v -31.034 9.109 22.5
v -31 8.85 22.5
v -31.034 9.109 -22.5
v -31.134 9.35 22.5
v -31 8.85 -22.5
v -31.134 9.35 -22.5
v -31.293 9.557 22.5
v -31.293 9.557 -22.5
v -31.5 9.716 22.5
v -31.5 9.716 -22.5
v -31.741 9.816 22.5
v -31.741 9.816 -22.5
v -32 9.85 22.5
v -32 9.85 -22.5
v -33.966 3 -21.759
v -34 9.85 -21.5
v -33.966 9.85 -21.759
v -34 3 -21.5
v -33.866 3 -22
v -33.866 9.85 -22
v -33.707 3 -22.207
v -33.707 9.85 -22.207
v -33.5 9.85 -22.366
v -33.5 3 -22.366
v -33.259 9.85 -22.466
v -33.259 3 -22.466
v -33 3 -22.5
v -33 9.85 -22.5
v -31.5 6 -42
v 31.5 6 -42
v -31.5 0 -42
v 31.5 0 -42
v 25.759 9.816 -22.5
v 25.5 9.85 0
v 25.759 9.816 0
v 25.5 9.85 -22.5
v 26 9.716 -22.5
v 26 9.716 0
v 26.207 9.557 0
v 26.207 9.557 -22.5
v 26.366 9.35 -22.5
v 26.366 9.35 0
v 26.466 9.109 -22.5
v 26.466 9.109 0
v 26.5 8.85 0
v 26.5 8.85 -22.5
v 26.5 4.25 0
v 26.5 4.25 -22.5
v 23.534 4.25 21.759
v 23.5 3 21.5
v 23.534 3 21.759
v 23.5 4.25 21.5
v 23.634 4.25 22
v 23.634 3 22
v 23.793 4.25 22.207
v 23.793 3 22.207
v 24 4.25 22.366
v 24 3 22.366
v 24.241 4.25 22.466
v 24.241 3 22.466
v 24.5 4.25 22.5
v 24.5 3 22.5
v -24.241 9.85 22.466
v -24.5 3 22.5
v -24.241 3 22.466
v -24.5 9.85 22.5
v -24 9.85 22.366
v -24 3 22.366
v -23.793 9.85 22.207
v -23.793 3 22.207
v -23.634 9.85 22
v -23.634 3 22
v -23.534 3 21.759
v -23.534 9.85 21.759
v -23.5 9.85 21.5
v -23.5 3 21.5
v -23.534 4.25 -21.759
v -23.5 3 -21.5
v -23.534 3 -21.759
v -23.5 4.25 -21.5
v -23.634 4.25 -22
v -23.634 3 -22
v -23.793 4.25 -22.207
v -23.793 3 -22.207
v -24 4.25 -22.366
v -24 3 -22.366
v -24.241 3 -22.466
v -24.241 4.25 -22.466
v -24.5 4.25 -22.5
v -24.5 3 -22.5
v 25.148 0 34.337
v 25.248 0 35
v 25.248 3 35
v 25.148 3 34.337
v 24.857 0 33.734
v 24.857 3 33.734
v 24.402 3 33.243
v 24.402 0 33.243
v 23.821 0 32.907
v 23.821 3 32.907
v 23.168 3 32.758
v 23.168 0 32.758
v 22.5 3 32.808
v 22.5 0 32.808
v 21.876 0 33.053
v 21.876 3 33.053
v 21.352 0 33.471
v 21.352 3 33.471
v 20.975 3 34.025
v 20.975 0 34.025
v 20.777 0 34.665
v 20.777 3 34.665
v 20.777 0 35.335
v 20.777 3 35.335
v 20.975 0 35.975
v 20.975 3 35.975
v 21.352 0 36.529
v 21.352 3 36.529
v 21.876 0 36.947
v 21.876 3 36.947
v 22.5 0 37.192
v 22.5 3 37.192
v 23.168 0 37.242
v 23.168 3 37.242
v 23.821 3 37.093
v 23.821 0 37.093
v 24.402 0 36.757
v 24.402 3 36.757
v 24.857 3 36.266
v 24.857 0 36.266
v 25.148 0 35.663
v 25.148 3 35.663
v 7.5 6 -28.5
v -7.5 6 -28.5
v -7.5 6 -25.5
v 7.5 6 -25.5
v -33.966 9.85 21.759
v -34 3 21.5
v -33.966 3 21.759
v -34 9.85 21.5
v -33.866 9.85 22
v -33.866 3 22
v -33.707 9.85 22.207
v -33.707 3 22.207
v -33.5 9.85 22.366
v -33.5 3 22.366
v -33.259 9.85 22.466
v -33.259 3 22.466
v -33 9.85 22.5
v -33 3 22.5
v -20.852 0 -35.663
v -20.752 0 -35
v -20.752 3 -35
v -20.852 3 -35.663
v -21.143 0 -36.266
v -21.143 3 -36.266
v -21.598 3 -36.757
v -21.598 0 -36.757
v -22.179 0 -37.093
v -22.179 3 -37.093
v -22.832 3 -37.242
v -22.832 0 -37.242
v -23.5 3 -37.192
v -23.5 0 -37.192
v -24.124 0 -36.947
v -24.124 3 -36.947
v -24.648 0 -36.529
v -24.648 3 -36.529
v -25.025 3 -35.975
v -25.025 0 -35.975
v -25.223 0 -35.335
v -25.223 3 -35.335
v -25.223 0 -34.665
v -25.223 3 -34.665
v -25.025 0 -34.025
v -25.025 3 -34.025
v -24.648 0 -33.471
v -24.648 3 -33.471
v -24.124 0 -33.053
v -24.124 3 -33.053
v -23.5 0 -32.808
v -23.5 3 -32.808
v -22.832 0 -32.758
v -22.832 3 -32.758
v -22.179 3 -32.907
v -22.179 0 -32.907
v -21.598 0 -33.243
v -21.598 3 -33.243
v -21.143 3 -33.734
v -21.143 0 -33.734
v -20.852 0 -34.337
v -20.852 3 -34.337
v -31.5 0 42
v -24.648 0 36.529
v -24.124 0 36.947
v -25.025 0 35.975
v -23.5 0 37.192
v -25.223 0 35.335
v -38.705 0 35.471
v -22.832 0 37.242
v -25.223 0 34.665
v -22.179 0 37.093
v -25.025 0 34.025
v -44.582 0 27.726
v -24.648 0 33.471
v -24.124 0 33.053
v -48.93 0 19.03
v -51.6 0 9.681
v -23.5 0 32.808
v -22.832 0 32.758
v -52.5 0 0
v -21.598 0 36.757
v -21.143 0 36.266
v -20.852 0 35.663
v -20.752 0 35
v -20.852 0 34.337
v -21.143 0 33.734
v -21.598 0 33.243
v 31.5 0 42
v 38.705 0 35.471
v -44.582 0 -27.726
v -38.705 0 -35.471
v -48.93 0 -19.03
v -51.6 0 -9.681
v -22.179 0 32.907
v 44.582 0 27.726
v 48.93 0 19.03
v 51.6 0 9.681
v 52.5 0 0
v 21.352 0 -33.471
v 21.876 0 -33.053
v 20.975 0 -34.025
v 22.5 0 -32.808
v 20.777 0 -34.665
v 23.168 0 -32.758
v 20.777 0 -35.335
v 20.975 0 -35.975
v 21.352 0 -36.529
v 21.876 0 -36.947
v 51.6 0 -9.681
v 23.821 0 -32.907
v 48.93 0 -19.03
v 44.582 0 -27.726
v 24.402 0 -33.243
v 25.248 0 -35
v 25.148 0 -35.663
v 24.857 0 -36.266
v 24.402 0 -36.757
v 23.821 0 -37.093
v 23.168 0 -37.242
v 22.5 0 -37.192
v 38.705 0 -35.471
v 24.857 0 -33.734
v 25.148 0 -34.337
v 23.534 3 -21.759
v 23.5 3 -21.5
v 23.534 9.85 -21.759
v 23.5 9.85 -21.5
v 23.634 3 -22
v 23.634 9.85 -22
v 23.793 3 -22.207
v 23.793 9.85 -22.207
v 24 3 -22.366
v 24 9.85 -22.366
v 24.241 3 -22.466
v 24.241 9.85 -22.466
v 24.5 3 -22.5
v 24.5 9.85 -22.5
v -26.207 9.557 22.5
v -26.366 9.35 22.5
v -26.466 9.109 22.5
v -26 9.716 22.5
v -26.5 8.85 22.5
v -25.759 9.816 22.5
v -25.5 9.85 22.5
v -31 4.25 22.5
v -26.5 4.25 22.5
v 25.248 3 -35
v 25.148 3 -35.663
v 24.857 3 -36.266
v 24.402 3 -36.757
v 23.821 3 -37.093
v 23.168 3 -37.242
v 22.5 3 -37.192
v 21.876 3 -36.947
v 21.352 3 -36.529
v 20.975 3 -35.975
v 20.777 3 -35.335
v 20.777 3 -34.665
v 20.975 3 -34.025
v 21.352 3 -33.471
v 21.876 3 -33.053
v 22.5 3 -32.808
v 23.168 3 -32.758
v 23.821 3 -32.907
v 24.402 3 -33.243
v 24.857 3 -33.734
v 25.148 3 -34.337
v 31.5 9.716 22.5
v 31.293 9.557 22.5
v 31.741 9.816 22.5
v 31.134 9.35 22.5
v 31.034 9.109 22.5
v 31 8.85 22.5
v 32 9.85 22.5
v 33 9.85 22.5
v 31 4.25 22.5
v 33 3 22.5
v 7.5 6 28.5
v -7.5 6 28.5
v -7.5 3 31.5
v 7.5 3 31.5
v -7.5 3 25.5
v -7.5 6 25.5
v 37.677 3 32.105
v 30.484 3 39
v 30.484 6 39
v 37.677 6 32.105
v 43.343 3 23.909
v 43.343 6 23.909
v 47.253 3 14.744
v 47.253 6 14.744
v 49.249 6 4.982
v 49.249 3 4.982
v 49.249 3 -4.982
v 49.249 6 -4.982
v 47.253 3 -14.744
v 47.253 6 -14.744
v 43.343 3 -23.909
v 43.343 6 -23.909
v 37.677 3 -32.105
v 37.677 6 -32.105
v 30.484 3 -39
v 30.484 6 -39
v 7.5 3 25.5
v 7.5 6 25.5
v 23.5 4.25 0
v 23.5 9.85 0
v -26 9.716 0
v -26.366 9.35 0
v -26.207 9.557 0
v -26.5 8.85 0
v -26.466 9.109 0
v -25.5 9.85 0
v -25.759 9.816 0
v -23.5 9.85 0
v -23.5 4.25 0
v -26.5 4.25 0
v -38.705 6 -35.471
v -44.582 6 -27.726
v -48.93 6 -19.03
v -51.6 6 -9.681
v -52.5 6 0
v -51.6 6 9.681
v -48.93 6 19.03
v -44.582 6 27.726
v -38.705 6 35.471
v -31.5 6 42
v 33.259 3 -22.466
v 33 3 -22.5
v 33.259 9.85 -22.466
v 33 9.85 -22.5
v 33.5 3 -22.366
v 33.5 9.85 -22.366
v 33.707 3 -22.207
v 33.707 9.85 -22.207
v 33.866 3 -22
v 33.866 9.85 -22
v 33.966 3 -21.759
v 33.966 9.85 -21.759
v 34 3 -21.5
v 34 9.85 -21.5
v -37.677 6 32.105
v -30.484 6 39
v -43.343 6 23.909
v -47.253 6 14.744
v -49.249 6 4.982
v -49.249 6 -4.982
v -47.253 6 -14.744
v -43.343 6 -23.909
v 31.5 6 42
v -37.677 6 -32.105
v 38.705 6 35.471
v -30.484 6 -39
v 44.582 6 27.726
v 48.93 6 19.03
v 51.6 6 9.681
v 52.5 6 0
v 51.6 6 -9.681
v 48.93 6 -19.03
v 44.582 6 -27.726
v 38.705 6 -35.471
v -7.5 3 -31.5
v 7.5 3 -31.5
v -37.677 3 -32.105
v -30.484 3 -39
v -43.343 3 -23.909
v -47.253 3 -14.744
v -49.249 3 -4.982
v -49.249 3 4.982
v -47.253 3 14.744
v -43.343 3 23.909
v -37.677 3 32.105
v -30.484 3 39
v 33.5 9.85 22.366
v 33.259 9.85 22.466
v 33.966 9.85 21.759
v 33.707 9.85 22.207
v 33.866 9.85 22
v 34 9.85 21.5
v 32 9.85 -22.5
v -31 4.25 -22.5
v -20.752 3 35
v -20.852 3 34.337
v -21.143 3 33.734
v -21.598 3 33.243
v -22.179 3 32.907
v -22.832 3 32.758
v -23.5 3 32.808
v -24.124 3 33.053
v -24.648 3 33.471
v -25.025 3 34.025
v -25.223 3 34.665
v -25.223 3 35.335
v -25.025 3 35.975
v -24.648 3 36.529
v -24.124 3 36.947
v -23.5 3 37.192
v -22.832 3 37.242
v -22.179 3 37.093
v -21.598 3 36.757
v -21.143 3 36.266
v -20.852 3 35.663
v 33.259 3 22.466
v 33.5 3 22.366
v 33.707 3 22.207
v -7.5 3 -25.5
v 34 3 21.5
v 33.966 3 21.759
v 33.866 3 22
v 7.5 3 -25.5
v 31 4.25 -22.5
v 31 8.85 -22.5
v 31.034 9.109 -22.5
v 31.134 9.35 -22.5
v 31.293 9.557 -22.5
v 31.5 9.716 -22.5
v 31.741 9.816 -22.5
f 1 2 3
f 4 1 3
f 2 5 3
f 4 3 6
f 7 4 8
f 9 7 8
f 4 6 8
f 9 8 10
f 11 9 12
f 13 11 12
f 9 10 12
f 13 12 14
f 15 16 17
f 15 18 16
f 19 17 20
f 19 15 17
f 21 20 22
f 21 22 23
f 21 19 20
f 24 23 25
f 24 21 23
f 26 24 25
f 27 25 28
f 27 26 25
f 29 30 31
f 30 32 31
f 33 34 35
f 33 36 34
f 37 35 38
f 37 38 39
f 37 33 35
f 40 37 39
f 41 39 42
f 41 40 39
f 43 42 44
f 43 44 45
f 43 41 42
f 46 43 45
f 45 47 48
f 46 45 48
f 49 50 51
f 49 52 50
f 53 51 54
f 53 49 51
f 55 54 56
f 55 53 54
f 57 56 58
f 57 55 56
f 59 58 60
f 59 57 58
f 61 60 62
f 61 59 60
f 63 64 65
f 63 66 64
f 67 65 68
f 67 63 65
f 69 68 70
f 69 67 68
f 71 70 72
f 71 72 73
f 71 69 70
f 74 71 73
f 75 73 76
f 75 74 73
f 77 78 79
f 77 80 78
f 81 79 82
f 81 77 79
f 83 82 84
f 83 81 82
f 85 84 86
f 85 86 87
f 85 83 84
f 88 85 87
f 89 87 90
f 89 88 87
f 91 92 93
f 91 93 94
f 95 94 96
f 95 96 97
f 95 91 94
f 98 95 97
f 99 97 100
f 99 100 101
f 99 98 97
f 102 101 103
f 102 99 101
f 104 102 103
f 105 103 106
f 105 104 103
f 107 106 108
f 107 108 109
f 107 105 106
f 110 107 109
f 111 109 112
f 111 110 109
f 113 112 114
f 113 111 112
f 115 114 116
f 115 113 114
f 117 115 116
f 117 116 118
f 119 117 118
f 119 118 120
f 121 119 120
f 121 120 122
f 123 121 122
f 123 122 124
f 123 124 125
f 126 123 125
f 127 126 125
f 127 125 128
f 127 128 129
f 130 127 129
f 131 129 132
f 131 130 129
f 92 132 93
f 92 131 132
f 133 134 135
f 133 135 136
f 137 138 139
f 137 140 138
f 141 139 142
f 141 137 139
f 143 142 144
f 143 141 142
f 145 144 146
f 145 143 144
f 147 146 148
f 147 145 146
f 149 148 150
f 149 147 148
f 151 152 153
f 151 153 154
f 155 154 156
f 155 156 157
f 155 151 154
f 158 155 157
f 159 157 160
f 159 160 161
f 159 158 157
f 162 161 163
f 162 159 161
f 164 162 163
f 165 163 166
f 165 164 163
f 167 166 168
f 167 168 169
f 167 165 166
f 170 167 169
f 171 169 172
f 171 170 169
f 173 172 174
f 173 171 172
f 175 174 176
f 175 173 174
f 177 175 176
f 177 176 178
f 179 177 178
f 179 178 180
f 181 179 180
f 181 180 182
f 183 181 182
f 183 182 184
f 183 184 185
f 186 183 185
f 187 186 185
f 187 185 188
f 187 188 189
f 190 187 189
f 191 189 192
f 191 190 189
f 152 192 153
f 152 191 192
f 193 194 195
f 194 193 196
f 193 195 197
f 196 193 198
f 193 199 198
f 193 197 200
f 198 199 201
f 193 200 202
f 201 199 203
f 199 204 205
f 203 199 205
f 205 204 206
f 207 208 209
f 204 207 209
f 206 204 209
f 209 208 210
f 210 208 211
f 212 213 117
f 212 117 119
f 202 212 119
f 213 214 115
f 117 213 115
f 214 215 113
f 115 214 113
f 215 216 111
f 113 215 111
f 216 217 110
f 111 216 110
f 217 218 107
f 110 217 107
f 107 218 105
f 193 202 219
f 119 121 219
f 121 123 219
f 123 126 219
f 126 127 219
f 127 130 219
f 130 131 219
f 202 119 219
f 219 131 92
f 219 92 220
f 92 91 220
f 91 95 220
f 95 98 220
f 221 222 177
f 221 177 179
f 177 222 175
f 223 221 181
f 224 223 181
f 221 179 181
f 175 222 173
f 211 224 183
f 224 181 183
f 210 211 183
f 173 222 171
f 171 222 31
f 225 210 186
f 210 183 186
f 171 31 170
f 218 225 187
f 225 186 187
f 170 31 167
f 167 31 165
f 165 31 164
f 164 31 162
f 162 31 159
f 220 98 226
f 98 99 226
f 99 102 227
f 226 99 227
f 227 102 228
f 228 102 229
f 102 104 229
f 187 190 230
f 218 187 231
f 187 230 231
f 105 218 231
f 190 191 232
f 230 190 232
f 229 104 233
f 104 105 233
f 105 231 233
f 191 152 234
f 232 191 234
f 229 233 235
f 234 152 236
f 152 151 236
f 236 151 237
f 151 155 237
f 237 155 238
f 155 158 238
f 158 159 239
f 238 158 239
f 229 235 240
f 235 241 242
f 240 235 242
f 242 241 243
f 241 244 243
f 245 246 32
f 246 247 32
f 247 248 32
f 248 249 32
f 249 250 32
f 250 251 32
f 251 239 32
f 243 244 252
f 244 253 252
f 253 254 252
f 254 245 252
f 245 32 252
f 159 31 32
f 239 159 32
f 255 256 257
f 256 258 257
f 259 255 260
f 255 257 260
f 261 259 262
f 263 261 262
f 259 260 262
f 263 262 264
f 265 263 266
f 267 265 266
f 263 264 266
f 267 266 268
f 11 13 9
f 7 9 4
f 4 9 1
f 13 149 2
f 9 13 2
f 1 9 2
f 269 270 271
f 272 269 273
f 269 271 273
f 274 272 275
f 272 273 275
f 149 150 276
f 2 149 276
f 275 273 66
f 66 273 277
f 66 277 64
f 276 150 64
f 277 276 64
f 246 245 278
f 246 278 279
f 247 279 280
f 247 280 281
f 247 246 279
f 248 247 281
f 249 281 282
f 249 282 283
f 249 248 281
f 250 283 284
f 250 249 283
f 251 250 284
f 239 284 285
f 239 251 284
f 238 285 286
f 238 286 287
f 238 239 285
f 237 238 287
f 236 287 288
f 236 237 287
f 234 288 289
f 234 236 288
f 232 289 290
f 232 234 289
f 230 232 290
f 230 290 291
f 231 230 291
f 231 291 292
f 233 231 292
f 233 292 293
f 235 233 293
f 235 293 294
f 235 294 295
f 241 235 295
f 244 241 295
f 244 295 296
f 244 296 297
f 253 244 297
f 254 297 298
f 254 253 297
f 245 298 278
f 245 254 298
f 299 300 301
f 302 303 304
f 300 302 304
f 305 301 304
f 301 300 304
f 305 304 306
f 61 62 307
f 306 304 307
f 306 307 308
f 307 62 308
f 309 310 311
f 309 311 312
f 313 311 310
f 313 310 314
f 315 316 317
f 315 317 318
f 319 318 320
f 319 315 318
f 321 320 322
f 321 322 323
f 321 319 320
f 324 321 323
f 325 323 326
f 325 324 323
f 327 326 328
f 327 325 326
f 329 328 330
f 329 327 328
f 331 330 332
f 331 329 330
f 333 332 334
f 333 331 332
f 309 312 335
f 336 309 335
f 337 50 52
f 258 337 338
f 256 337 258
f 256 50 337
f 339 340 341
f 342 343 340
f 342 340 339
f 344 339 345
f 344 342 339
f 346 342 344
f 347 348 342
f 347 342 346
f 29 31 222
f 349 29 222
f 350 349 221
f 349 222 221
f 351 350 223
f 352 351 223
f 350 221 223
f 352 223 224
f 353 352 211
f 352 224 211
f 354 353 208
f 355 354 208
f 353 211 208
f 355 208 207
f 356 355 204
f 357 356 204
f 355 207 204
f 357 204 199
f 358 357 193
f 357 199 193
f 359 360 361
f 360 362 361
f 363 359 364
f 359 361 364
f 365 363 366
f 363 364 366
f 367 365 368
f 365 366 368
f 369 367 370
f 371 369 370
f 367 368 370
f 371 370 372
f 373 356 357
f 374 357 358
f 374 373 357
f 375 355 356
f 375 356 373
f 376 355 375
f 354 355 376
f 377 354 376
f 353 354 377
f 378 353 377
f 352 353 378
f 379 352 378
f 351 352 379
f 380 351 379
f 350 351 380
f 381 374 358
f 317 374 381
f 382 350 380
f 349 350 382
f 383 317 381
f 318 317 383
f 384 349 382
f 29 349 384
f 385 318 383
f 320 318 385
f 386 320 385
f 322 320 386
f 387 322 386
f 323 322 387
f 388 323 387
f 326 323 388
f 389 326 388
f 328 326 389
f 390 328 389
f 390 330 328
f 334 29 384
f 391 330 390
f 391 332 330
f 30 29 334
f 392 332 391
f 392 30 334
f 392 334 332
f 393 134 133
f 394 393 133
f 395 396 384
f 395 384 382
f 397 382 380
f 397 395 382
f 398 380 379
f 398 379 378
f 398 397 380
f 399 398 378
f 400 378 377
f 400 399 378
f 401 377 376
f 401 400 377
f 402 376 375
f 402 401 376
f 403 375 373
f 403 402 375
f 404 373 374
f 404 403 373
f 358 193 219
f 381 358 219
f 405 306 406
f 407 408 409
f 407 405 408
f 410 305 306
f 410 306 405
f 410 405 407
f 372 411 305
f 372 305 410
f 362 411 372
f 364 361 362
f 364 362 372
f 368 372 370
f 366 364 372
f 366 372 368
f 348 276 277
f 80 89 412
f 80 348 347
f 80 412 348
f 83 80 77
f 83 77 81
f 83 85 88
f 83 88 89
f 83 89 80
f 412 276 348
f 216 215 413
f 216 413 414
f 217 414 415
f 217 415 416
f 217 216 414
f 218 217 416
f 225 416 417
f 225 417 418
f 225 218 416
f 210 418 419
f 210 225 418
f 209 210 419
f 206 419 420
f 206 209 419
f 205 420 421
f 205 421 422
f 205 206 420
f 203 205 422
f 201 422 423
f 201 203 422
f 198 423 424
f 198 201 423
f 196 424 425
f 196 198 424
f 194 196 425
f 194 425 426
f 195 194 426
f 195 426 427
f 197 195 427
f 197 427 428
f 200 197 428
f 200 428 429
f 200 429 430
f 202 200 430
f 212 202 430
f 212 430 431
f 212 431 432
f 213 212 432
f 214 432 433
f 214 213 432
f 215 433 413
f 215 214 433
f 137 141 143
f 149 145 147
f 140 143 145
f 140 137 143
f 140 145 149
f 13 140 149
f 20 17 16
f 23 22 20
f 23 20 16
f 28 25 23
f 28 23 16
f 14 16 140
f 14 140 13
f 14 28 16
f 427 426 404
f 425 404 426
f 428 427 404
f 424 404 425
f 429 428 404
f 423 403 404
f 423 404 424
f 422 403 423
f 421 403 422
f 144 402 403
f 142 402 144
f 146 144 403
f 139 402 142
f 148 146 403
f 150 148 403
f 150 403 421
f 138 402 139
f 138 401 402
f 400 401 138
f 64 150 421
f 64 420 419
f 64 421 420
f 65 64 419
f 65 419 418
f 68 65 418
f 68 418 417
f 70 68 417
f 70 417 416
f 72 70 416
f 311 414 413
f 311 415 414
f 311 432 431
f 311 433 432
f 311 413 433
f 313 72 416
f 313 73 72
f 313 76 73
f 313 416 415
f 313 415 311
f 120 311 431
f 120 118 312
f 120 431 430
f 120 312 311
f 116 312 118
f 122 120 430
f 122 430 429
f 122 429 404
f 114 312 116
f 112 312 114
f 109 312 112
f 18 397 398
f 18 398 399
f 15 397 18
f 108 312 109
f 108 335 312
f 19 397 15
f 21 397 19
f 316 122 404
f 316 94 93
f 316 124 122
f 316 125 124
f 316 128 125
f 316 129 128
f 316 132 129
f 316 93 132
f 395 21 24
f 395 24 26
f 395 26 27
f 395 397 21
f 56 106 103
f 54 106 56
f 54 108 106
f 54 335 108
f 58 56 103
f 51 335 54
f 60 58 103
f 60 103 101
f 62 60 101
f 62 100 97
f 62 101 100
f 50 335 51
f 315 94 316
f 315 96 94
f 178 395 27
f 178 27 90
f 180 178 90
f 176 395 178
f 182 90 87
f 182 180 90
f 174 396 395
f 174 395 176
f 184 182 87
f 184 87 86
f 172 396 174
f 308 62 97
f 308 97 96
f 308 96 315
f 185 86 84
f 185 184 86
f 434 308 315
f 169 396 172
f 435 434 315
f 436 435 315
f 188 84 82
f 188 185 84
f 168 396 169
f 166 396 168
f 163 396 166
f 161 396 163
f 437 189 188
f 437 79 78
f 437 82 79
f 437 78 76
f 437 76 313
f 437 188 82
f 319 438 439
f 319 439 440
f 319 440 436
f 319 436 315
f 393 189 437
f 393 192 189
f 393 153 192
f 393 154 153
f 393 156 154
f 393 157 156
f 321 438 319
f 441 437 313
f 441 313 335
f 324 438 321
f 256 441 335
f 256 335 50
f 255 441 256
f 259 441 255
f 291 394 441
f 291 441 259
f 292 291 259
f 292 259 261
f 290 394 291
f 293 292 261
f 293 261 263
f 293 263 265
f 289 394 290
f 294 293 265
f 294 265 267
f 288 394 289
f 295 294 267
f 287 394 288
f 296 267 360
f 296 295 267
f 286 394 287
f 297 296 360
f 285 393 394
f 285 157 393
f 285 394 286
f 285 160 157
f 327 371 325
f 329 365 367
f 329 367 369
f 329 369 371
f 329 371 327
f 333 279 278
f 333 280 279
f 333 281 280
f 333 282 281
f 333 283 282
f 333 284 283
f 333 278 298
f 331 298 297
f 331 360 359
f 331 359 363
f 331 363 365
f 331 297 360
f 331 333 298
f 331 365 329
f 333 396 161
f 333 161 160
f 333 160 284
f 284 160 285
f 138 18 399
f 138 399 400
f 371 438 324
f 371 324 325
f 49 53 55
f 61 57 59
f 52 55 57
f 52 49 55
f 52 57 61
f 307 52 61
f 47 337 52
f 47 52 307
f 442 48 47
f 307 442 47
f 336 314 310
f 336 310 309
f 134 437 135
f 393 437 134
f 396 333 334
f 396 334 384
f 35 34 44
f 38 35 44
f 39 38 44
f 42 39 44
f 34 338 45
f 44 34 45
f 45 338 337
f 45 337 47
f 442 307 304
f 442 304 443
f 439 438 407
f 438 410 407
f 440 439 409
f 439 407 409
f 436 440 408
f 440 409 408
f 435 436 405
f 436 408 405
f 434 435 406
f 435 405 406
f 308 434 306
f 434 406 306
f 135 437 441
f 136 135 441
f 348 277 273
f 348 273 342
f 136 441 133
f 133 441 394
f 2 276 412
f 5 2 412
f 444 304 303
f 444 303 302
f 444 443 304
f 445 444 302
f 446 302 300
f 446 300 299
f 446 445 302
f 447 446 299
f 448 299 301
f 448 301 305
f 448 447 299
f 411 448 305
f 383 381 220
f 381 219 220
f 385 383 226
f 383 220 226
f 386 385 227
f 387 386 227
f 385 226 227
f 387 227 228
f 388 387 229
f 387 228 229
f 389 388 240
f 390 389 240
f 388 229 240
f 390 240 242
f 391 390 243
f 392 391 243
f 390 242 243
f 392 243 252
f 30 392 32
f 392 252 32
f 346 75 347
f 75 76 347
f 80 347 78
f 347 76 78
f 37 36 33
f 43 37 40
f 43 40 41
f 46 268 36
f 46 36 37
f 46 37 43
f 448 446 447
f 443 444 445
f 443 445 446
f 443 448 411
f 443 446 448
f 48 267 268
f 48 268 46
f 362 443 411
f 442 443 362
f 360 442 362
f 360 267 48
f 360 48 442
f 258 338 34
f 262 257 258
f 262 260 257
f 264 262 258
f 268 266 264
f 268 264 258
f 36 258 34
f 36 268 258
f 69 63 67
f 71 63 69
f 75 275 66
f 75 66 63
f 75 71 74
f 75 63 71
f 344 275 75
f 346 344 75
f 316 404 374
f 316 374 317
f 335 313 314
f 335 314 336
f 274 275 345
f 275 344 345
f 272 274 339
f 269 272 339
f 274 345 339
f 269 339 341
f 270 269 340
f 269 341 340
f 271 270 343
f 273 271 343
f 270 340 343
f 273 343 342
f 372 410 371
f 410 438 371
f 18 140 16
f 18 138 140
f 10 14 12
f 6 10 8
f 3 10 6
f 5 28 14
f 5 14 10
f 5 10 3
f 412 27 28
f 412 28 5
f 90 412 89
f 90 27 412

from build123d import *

# Parameters (mm, degrees)
A_BASE_T42_OUTLINE_R               = 2.2479
A_BASE_T42_OUTLINE_R_2             = 1
A_BASE_T42_DEPTH                   = 3
OUTER_BRIM_DEPTH                   = 3
SKETCH5_W                          = 15
SKETCH5_H                          = 3
BASE_SUPPORTS_DEPTH                = 3
BASE_SUPPORTS_CHAMFER_SIZE         = 3
COVER_START                        = -3
SKETCH6_R                          = 1
COVER_DEPTH                        = 3
SKETCH2_W                          = 10.5
SKETCH2_H                          = 45
DYNAMIXEL_OFFSET_DEPTH             = 1.25
SKETCH3_W                          = 3
SKETCH3_H                          = 45
SKETCH3_H_2                        = 22.5
DYNAMIXEL_SIDE_SUPPORT_WALLS_DEPTH = 5.6
DYNAMIXEL_SUPPORT_CONTOURING_R     = 1


# Read off the part's stored shape, not the designer's step: a_base_t42
with BuildPart() as part:
    # a_base_t42 outline → a_base_t42 (new body)
    with BuildSketch(Plane(origin=(0, 0, 0), x_dir=(1, 0, 0), z_dir=(0, 1, 0))):
        with BuildLine():
            ThreePointArc((31.5, -42), (52.5, 0), (31.5, 42))
            Line((31.5, 42), (-31.5, 42))
            ThreePointArc((-31.5, 42), (-52.5, 0), (-31.5, -42))
            Line((-31.5, -42), (31.5, -42))
        make_face()
        with Locations((-23, -35)):
            Circle(A_BASE_T42_OUTLINE_R, mode=Mode.SUBTRACT)
        with Locations((23, -35)):
            Circle(A_BASE_T42_OUTLINE_R, mode=Mode.SUBTRACT)
        with Locations((-40.25, 0)):
            Circle(A_BASE_T42_OUTLINE_R_2, mode=Mode.SUBTRACT)
        with Locations((-23, 35)):
            Circle(A_BASE_T42_OUTLINE_R, mode=Mode.SUBTRACT)
        with Locations((40.25, 0)):
            Circle(A_BASE_T42_OUTLINE_R_2, mode=Mode.SUBTRACT)
        with Locations((23, 35)):
            Circle(A_BASE_T42_OUTLINE_R, mode=Mode.SUBTRACT)
    extrude(amount=A_BASE_T42_DEPTH)

    # Sketch1 → Outer Brim (add)
    with BuildSketch(Plane(origin=(0, 3, 0), x_dir=(1, 0, 0), z_dir=(0, 1, 0))):
        with BuildLine():
            Line((-31.5, -42), (31.5, -42))
            ThreePointArc((31.5, -42), (52.5, 0), (31.5, 42))
            Line((31.5, 42), (-31.5, 42))
            ThreePointArc((-31.5, 42), (-52.5, 0), (-31.5, -42))
        make_face()
        with BuildLine():
            Line((30.483602149, 39), (-30.483602149, 39))
            ThreePointArc((-30.483602149, 39), (-49.5, 0), (-30.483602149, -39))
            Line((-30.483602149, -39), (30.483602149, -39))
            ThreePointArc((30.483602149, -39), (49.5, 0), (30.483602149, 39))
        make_face(mode=Mode.SUBTRACT)
    extrude(amount=OUTER_BRIM_DEPTH)

    # Sketch5 → Base Supports (add)
    with BuildSketch(Plane(origin=(0, 3, 0), x_dir=(1, 0, 0), z_dir=(0, 1, 0))):
        with Locations((0, -27)):
            Rectangle(SKETCH5_W, SKETCH5_H)
        with Locations((0, 27)):
            Rectangle(SKETCH5_W, SKETCH5_H)
    extrude(amount=BASE_SUPPORTS_DEPTH)

    # Base Supports Chamfer
    base_supports_chamfer_edges = [part.edges().sort_by_distance(p)[0] for p in [
        (0, 3, 28.5),
        (0, 3, -28.5),
    ]]
    chamfer(base_supports_chamfer_edges, length=BASE_SUPPORTS_CHAMFER_SIZE - 0.0001)  # a hair under: the kernel refuses the full size

    # Sketch6 → Cover (add)
    with BuildSketch(Plane(origin=(0, 3, 0), x_dir=(1, 0, 0), z_dir=(0, 1, 0)).offset(COVER_START)):
        with Locations((-40.25, 0)):
            Circle(SKETCH6_R)
        with Locations((40.25, 0)):
            Circle(SKETCH6_R)
    extrude(amount=COVER_DEPTH)

    # Sketch2 → Dynamixel Offset (add)
    with BuildSketch(Plane(origin=(0, 3, 0), x_dir=(1, 0, 0), z_dir=(0, 1, 0))):
        with Locations((28.75, 0)):
            Rectangle(SKETCH2_W, SKETCH2_H)
        with Locations((-28.75, 0)):
            Rectangle(SKETCH2_W, SKETCH2_H)
    extrude(amount=DYNAMIXEL_OFFSET_DEPTH)

    # Sketch3 → Dynamixel Side Support Walls (add)
    with BuildSketch(Plane(origin=(0, 4.25, 0), x_dir=(1, 0, 0), z_dir=(0, 1, 0))):
        with Locations((-32.5, 0)):
            Rectangle(SKETCH3_W, SKETCH3_H)
        with Locations((-25, -11.25)):
            Rectangle(SKETCH3_W, SKETCH3_H_2)
        with Locations((25, 11.25)):
            Rectangle(SKETCH3_W, SKETCH3_H_2)
        with Locations((32.5, 0)):
            Rectangle(SKETCH3_W, SKETCH3_H)
    extrude(amount=DYNAMIXEL_SIDE_SUPPORT_WALLS_DEPTH)

    # Dynamixel Support Contouring
    dynamixel_support_contouring_edges = [part.edges().sort_by_distance(p)[0] for p in [
        (34, 6.425, -22.5),
        (23.5, 6.425, -22.5),
        (-23.5, 3.625, -22.5),
        (-34, 6.425, -22.5),
        (-34, 6.425, 22.5),
        (-23.5, 6.425, 22.5),
        (34, 6.425, 22.5),
        (23.5, 3.625, 22.5),
        (31, 9.85, 0),
        (26.5, 9.85, -11.25),
        (-26.5, 9.85, 11.25),
        (-31, 9.85, 0),
    ]]
    fillet(dynamixel_support_contouring_edges, radius=DYNAMIXEL_SUPPORT_CONTOURING_R)


solid = part.part
